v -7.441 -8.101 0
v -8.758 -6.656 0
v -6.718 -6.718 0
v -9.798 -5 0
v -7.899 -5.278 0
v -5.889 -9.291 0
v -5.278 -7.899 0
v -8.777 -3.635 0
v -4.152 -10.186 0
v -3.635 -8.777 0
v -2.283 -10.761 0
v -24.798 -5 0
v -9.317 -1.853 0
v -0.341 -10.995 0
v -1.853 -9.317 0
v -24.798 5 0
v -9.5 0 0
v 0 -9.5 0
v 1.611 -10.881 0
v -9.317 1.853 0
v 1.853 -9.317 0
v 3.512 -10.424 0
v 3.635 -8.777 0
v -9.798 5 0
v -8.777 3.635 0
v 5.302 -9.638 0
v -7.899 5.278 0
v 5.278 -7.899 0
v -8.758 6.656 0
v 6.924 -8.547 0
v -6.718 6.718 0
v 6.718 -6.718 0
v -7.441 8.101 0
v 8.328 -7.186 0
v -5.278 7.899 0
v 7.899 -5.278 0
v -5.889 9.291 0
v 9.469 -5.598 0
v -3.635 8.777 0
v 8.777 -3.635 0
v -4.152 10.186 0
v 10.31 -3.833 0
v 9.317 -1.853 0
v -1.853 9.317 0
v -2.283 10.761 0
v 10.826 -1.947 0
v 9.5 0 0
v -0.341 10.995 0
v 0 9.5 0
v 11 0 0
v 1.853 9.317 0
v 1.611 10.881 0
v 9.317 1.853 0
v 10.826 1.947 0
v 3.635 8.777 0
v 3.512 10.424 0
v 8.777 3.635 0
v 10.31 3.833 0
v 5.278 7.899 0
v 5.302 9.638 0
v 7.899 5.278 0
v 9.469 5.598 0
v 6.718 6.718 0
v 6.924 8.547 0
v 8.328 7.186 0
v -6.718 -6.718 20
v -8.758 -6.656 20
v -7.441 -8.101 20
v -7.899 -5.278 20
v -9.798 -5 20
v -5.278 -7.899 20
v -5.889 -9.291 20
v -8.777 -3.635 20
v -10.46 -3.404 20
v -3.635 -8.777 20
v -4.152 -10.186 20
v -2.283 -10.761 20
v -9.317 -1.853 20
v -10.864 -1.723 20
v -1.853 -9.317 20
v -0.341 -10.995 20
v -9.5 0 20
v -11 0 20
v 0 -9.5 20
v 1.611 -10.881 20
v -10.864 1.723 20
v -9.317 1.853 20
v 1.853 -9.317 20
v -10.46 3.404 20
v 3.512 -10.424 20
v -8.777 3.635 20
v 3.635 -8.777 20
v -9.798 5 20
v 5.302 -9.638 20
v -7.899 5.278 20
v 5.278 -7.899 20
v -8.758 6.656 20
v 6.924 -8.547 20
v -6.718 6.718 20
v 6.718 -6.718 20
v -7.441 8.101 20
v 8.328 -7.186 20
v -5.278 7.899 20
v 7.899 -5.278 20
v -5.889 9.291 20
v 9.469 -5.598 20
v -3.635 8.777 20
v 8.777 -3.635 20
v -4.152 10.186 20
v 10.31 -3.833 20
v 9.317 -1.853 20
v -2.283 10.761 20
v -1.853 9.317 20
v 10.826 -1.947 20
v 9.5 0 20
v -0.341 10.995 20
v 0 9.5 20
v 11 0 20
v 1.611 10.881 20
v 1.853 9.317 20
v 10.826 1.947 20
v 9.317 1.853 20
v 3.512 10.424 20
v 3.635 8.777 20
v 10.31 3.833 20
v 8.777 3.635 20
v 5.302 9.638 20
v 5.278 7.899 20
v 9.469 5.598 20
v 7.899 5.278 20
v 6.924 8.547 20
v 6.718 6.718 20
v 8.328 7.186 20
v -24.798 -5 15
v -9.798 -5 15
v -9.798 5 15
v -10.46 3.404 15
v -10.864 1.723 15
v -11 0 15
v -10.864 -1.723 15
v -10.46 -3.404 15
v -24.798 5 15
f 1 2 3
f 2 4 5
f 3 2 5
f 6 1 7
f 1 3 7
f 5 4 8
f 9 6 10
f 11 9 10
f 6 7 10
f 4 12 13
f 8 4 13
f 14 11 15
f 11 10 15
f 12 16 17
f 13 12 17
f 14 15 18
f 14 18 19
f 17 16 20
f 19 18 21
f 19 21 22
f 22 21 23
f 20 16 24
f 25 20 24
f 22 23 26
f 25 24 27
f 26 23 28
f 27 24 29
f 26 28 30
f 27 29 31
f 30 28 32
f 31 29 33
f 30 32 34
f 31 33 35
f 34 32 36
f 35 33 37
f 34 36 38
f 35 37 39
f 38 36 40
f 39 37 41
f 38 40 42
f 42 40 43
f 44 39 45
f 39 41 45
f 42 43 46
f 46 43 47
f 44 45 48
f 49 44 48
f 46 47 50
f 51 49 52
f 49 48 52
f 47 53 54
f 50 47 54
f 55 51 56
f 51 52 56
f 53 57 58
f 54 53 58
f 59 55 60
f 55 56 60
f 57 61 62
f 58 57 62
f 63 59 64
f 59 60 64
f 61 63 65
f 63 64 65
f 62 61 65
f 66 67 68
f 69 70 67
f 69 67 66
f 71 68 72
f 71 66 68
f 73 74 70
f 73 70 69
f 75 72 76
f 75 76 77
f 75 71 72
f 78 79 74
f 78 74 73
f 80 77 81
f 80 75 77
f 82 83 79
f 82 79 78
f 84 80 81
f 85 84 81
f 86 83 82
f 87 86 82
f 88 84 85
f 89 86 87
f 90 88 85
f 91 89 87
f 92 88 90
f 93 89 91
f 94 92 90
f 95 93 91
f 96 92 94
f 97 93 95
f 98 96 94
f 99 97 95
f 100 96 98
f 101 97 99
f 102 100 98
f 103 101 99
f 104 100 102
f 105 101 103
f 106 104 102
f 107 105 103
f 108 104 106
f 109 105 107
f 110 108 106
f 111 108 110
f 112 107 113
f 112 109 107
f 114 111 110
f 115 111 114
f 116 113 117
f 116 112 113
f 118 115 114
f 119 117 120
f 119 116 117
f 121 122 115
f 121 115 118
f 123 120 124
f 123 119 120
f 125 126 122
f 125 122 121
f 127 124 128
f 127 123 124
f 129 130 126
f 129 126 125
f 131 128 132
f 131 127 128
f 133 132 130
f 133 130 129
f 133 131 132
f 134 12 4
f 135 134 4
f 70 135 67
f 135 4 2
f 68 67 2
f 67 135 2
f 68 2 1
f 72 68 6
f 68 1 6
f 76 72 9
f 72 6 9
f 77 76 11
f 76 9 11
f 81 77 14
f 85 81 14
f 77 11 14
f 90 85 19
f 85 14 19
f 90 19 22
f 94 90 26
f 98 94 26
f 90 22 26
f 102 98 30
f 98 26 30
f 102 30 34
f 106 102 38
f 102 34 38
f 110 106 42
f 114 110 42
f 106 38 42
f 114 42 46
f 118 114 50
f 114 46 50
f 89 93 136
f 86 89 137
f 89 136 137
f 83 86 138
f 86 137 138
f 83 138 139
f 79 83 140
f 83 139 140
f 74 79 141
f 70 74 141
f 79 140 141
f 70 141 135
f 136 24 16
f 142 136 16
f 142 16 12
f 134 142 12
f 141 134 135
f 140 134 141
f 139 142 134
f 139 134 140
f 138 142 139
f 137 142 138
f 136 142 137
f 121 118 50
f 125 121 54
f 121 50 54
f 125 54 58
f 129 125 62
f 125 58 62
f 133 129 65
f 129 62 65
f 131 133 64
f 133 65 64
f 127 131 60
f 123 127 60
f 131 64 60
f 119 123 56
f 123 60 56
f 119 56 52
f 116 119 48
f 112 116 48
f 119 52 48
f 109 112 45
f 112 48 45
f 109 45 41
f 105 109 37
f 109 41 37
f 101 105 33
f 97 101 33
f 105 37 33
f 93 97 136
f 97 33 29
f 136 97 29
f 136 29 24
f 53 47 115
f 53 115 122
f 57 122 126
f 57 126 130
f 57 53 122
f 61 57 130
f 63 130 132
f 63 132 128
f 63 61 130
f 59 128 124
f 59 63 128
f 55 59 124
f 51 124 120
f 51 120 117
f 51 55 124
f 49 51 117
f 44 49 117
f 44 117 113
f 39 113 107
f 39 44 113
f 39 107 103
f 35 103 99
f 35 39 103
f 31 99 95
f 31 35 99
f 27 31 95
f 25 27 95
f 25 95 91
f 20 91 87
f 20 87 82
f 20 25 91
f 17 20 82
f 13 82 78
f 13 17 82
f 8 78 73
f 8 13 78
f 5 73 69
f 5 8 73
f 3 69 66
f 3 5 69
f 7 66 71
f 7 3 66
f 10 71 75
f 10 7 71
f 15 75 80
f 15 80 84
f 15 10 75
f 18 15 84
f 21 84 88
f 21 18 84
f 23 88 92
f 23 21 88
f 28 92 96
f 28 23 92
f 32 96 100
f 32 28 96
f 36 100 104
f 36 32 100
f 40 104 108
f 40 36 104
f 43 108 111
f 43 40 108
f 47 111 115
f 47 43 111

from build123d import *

# Parameters (mm, degrees)
F0_R     = 9.5
F1_DEPTH = 20
F2_DEPTH = 15


with BuildPart() as f1:
    # F0 (on Top) → F1 (new body)
    with BuildSketch(Plane.XY):
        with BuildLine():
            ThreePointArc((11, 0), (2.57123, 10.695269), (-9.797959, 5))
            ThreePointArc((-9.797959, 5), (-11, 0), (-9.797959, -5))
            ThreePointArc((-9.797959, -5), (2.57123, -10.695269), (11, 0))
        make_face()
        Circle(F0_R, mode=Mode.SUBTRACT)
    extrude(amount=F1_DEPTH)

    # F0 (on Top) → F2 (join)
    with BuildSketch(Plane.XY):
        with BuildLine():
            Line((-9.797959, 5), (-24.797959, 5))
            Line((-24.797959, 5), (-24.797959, -5))
            Line((-24.797959, -5), (-9.797959, -5))
            ThreePointArc((-9.797959, -5), (-11, 0), (-9.797959, 5))
        make_face()
    extrude(amount=F2_DEPTH)


solid = f1.part
